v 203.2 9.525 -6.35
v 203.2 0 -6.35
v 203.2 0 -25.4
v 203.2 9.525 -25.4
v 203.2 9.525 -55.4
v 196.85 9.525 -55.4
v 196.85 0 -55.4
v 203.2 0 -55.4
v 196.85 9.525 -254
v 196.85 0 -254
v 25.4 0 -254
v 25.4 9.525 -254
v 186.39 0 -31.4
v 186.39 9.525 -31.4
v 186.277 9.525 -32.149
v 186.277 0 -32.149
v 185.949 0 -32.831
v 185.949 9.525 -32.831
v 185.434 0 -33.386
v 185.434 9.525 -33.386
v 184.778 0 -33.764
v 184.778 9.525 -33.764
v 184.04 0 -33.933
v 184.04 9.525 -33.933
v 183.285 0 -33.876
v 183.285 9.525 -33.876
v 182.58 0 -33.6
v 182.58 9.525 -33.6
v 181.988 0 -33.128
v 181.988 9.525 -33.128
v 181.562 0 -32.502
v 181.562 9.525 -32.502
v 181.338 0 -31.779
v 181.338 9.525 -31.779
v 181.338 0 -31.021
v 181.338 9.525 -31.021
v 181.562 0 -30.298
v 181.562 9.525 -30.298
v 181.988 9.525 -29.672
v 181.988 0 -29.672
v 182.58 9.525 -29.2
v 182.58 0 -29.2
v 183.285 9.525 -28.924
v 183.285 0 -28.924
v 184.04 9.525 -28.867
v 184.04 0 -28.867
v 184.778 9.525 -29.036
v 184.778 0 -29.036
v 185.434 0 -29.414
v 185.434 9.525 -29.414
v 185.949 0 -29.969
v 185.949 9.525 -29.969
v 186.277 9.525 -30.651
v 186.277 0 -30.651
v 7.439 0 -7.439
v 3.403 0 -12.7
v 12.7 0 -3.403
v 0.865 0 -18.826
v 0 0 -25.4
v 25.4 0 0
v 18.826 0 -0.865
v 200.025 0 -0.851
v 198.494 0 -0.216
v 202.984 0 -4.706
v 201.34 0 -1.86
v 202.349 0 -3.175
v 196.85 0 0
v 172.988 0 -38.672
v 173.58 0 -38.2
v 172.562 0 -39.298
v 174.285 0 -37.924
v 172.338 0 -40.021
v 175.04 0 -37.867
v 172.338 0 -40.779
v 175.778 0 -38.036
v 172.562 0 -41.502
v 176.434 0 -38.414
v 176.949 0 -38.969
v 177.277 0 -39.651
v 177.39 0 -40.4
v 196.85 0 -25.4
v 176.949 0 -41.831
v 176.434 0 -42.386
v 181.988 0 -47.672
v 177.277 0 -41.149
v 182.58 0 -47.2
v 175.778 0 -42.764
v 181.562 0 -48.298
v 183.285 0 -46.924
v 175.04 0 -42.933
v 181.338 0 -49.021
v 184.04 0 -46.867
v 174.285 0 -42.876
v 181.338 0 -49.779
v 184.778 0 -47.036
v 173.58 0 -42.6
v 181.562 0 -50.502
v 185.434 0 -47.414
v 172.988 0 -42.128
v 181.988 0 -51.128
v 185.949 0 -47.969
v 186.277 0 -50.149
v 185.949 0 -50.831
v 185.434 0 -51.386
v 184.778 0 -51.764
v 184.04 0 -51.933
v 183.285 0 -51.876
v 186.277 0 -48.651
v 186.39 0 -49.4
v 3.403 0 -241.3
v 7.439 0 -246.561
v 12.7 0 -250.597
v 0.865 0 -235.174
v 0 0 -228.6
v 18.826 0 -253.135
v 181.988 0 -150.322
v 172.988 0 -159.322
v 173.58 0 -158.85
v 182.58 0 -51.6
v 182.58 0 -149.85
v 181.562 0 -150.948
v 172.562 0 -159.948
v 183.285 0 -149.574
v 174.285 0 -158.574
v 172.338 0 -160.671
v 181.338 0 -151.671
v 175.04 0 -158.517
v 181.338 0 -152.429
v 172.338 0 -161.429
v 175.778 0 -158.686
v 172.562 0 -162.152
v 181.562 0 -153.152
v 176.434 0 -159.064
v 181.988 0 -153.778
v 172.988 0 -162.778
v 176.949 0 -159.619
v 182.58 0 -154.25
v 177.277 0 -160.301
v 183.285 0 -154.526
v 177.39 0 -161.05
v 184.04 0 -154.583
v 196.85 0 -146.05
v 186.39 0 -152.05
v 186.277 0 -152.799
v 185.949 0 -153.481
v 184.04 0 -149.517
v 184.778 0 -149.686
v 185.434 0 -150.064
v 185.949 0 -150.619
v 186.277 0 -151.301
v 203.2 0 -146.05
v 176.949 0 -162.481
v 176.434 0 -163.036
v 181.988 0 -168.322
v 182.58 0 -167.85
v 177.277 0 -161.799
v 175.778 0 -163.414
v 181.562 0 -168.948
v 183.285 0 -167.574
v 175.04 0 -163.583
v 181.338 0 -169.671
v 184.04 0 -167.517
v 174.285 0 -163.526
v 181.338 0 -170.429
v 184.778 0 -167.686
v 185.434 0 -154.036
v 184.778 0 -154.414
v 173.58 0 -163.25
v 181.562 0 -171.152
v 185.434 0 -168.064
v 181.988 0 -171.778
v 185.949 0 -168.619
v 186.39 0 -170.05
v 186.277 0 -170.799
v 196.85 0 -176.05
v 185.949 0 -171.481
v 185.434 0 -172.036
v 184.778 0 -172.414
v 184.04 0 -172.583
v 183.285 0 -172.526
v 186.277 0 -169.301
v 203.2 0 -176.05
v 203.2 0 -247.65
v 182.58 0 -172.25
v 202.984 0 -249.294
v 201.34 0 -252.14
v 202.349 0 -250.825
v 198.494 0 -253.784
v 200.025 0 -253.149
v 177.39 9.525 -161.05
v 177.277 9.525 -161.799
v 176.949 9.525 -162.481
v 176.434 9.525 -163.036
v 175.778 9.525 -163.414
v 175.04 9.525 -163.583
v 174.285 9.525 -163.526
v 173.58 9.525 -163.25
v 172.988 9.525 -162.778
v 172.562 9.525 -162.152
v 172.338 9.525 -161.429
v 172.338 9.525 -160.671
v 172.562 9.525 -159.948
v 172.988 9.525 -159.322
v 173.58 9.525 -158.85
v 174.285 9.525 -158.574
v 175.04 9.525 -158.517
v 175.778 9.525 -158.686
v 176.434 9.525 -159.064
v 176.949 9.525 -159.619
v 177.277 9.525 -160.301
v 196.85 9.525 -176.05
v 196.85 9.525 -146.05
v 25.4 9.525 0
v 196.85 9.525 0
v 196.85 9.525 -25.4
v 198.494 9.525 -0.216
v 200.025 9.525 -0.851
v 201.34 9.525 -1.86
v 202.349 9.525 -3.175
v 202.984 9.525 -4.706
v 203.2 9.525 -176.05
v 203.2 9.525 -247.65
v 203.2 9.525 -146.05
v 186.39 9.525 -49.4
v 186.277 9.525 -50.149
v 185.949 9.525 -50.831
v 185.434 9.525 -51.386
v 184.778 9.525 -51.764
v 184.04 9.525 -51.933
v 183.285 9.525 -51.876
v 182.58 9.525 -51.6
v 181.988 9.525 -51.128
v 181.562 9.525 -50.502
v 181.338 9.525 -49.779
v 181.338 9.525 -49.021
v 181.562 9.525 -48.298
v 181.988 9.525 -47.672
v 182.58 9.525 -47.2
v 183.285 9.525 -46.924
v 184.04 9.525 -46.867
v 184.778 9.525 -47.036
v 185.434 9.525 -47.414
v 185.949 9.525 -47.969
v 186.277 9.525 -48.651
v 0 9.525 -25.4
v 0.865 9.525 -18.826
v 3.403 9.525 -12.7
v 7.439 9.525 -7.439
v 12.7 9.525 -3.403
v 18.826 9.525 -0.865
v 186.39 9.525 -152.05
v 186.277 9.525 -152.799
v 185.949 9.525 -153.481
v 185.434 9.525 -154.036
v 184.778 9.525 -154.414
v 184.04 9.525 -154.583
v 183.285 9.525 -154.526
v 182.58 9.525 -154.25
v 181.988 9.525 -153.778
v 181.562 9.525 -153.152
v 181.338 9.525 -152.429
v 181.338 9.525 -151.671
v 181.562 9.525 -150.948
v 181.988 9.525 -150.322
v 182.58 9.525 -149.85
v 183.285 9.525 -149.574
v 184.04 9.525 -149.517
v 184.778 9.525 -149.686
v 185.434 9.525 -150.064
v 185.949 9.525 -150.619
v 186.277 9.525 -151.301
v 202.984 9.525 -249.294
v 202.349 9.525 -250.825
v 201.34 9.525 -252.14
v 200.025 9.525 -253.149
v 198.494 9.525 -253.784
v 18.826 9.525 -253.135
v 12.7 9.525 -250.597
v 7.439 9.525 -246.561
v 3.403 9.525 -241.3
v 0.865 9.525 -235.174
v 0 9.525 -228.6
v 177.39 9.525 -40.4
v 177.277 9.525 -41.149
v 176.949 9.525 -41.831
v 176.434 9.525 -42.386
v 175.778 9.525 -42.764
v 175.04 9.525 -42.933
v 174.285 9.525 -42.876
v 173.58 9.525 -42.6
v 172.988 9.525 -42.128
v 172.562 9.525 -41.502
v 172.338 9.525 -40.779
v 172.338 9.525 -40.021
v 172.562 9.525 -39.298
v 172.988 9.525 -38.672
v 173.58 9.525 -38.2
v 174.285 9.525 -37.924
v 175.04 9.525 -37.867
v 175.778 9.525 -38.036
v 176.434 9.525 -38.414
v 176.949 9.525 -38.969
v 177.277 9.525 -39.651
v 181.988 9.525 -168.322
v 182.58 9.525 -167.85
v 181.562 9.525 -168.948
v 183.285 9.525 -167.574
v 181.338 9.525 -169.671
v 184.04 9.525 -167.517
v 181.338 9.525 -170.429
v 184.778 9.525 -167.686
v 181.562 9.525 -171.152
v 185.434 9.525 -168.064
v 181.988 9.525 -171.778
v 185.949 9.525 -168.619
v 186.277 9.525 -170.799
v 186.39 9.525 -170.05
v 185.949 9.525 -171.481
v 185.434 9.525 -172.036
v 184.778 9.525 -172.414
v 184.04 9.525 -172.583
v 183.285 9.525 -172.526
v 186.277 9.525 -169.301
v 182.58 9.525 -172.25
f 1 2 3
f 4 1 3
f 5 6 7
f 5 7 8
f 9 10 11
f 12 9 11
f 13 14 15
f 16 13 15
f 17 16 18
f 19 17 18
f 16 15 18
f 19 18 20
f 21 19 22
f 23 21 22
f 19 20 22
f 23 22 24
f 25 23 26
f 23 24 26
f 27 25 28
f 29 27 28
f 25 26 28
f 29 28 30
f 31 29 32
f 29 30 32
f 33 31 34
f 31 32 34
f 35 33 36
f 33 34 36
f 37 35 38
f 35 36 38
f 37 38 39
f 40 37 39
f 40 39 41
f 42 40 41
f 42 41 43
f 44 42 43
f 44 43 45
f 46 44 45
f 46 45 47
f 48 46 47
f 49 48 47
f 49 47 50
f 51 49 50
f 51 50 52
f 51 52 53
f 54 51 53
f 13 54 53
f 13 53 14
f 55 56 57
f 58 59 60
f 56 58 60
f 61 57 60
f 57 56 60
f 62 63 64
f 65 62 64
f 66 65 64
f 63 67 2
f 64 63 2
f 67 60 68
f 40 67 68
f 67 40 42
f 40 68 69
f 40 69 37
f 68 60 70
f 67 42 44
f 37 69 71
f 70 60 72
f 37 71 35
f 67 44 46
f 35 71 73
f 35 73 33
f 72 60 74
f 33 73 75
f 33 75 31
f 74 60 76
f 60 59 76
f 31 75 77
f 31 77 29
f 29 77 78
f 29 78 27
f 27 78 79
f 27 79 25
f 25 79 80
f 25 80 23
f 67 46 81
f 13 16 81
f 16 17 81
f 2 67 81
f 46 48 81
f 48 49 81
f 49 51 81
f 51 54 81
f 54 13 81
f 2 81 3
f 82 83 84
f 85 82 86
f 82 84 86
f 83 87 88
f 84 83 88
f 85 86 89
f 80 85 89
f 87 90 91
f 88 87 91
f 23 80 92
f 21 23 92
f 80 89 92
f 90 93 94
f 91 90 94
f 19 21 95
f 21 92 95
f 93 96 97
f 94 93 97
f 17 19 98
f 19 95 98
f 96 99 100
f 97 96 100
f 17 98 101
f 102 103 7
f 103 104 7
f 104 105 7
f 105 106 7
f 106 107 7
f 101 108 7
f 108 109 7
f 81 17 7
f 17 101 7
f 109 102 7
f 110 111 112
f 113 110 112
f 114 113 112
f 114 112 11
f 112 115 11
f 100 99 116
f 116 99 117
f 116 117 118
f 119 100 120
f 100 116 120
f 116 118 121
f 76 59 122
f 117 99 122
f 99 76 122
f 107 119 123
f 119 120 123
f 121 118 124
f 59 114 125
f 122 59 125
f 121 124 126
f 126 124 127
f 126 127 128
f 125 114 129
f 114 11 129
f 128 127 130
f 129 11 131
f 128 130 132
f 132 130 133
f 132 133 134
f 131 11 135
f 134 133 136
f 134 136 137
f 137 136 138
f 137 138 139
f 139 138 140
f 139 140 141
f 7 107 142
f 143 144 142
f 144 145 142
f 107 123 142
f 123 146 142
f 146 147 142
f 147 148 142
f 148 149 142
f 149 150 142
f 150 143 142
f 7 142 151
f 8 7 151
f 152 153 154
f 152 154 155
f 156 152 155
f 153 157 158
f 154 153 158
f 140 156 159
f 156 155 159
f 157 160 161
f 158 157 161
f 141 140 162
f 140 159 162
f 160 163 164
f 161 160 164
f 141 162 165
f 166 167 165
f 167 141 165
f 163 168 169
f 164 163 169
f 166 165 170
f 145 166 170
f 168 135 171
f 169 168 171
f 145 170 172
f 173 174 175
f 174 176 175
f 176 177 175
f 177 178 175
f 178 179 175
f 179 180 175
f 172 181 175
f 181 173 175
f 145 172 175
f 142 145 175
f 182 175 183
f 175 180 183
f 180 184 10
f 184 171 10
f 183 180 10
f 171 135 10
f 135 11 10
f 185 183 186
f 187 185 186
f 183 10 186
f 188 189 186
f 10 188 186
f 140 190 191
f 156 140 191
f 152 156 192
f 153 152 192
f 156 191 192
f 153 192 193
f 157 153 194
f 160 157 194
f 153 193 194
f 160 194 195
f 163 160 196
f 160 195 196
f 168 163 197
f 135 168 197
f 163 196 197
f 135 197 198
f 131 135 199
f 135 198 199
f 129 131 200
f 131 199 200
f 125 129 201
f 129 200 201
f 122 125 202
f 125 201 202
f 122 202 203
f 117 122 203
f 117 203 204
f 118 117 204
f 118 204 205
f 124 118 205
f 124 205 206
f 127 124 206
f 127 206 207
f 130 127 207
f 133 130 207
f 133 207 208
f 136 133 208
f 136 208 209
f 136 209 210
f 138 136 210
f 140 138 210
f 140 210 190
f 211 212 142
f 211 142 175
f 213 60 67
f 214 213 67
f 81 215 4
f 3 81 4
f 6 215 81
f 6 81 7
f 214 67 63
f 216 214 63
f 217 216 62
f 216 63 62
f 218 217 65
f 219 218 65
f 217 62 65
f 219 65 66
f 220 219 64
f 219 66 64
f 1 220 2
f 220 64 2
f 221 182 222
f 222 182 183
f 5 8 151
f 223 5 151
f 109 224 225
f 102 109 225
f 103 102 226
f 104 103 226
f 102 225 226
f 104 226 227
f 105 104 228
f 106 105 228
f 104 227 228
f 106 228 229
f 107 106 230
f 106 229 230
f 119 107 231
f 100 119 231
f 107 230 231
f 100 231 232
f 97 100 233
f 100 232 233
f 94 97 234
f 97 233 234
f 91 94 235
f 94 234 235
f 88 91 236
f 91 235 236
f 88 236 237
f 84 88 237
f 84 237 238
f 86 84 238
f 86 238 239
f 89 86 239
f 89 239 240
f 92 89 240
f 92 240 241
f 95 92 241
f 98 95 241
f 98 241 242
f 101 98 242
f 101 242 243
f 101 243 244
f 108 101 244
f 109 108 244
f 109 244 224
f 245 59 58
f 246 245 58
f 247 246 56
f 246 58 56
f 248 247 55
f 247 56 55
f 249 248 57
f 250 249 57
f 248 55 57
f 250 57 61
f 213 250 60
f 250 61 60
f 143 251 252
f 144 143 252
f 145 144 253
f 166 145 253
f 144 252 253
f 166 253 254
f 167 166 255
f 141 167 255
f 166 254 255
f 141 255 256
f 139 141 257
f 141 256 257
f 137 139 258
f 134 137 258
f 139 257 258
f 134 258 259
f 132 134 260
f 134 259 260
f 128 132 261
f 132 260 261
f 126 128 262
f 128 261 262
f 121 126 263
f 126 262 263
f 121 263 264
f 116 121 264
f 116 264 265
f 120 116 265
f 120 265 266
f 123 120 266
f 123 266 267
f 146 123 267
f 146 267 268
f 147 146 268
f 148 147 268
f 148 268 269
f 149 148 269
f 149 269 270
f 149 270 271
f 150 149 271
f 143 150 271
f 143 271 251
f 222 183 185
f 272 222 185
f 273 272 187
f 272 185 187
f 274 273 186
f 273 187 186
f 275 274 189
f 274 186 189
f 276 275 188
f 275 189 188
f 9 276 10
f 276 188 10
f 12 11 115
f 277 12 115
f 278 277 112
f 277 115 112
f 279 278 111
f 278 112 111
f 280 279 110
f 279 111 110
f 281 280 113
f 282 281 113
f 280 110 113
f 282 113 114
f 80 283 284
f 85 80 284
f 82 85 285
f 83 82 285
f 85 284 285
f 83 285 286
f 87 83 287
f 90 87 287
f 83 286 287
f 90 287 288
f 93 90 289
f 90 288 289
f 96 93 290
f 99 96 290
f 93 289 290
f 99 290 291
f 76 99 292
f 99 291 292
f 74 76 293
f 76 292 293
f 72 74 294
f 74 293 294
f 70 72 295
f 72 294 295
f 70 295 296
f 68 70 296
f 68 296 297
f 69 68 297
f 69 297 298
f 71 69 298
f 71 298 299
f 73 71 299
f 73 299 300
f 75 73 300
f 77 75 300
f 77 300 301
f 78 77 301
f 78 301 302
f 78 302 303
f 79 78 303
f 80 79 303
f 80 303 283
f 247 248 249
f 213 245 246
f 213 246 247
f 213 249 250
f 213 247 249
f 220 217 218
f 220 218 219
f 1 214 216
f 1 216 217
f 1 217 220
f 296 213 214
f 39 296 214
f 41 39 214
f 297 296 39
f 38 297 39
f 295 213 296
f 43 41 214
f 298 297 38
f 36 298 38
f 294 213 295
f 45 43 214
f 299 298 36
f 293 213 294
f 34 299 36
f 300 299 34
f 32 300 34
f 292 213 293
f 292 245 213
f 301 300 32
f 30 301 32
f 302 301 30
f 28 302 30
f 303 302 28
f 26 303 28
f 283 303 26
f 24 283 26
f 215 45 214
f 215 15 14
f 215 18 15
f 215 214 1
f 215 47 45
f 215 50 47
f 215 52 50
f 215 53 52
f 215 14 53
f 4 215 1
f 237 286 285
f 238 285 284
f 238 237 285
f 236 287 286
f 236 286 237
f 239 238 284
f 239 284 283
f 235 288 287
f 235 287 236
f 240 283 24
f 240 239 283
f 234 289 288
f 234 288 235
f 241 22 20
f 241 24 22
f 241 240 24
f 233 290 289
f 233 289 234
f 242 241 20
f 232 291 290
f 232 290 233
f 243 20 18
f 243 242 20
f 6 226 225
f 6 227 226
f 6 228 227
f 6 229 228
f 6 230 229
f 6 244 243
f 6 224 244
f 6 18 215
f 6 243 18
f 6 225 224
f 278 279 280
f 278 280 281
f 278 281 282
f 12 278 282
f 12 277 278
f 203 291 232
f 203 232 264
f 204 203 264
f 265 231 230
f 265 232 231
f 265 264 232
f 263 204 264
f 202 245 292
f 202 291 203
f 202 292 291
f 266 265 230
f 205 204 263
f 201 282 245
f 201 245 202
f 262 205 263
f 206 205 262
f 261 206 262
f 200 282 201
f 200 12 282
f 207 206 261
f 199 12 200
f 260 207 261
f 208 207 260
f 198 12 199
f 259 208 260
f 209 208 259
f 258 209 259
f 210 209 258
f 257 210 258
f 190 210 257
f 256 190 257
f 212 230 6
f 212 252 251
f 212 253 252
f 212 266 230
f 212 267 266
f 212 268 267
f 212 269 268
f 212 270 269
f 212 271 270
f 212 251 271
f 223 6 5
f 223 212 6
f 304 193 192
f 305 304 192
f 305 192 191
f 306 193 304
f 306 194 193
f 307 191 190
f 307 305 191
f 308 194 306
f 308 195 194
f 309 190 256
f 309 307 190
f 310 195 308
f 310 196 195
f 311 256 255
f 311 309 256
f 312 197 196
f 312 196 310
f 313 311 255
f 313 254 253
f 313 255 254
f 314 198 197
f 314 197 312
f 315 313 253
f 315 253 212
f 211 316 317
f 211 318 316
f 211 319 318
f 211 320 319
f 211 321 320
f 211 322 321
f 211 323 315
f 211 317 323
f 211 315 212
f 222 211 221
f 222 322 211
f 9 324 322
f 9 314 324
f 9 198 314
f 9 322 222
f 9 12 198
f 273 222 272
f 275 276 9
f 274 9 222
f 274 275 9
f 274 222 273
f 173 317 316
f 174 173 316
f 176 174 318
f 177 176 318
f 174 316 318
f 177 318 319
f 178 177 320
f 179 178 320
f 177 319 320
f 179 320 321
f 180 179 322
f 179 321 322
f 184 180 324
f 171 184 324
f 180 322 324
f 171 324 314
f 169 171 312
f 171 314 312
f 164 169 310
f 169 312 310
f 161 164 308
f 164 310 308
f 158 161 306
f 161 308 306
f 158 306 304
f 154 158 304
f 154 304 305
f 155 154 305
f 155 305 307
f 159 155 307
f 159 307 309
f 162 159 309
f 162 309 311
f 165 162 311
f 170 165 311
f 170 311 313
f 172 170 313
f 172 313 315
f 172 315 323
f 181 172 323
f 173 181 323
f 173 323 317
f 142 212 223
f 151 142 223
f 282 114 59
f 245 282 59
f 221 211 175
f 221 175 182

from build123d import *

# Parameters (mm, degrees)
BOSS_EXTRUDE1_DEPTH = 9.525
CUT_EXTRUDE1_REACH  = 11.525
SKETCH2_R           = 2.54
SKETCH2_W           = 6.35
SKETCH2_H           = 30


with BuildPart() as part:
    # Sketch1 → Boss-Extrude1 (new body)
    with BuildSketch(Plane(origin=(0, 0, 0), x_dir=(1, 0, 0), z_dir=(0, 1, 0))):
        with BuildLine():
            Line((25.4, 0), (196.85, 0))
            ThreePointArc((196.85, 0), (201.340128061, 1.859871939), (203.2, 6.35))
            Line((203.2, 6.35), (203.2, 247.65))
            ThreePointArc((203.2, 247.65), (201.340128061, 252.140128061), (196.85, 254))
            Line((196.85, 254), (25.4, 254))
            ThreePointArc((25.4, 254), (7.439487758, 246.560512242), (0, 228.6))
            Line((0, 228.6), (0, 25.4))
            ThreePointArc((0, 25.4), (7.439487758, 7.439487758), (25.4, 0))
        make_face()
    extrude(amount=BOSS_EXTRUDE1_DEPTH)

    # Sketch2 → Cut-Extrude1 (cut, up to next)
    with BuildSketch(Plane(origin=(0, 9.525, 0), x_dir=(1, 0, 0), z_dir=(0, 1, 0)), mode=Mode.PRIVATE) as cut_extrude1_sk1:
        with Locations((174.85000082, 40.4)):
            Circle(SKETCH2_R)
    cut_extrude1_tool1 = extrude(cut_extrude1_sk1.sketch, amount=-CUT_EXTRUDE1_REACH, mode=Mode.PRIVATE) & part.part
    add(cut_extrude1_tool1.solids().sort_by_distance((174.850001, 9.525, -40.4))[0], mode=Mode.SUBTRACT)
    # Sketch2 → Cut-Extrude1 (cut, up to next)
    with BuildSketch(Plane(origin=(0, 9.525, 0), x_dir=(1, 0, 0), z_dir=(0, 1, 0)), mode=Mode.PRIVATE) as cut_extrude1_sk2:
        with Locations((183.8500006, 49.39999978)):
            Circle(SKETCH2_R)
    cut_extrude1_tool2 = extrude(cut_extrude1_sk2.sketch, amount=-CUT_EXTRUDE1_REACH, mode=Mode.PRIVATE) & part.part
    add(cut_extrude1_tool2.solids().sort_by_distance((183.850001, 9.525, -49.4))[0], mode=Mode.SUBTRACT)
    # Sketch2 → Cut-Extrude1 (cut, up to next)
    with BuildSketch(Plane(origin=(0, 9.525, 0), x_dir=(1, 0, 0), z_dir=(0, 1, 0)), mode=Mode.PRIVATE) as cut_extrude1_sk3:
        with Locations((183.8500006, 31.40000022)):
            Circle(SKETCH2_R)
    cut_extrude1_tool3 = extrude(cut_extrude1_sk3.sketch, amount=-CUT_EXTRUDE1_REACH, mode=Mode.PRIVATE) & part.part
    add(cut_extrude1_tool3.solids().sort_by_distance((183.850001, 9.525, -31.4))[0], mode=Mode.SUBTRACT)
    # Sketch2 → Cut-Extrude1 (cut, up to next)
    with BuildSketch(Plane(origin=(0, 9.525, 0), x_dir=(1, 0, 0), z_dir=(0, 1, 0)), mode=Mode.PRIVATE) as cut_extrude1_sk4:
        with Locations((174.85000082, 161.05)):
            Circle(SKETCH2_R)
    cut_extrude1_tool4 = extrude(cut_extrude1_sk4.sketch, amount=-CUT_EXTRUDE1_REACH, mode=Mode.PRIVATE) & part.part
    add(cut_extrude1_tool4.solids().sort_by_distance((174.850001, 9.525, -161.05))[0], mode=Mode.SUBTRACT)
    # Sketch2 → Cut-Extrude1 (cut, up to next)
    with BuildSketch(Plane(origin=(0, 9.525, 0), x_dir=(1, 0, 0), z_dir=(0, 1, 0)), mode=Mode.PRIVATE) as cut_extrude1_sk5:
        with Locations((183.8500006, 170.04999978)):
            Circle(SKETCH2_R)
    cut_extrude1_tool5 = extrude(cut_extrude1_sk5.sketch, amount=-CUT_EXTRUDE1_REACH, mode=Mode.PRIVATE) & part.part
    add(cut_extrude1_tool5.solids().sort_by_distance((183.850001, 9.525, -170.05))[0], mode=Mode.SUBTRACT)
    # Sketch2 → Cut-Extrude1 (cut, up to next)
    with BuildSketch(Plane(origin=(0, 9.525, 0), x_dir=(1, 0, 0), z_dir=(0, 1, 0)), mode=Mode.PRIVATE) as cut_extrude1_sk6:
        with Locations((183.8500006, 152.05000022)):
            Circle(SKETCH2_R)
    cut_extrude1_tool6 = extrude(cut_extrude1_sk6.sketch, amount=-CUT_EXTRUDE1_REACH, mode=Mode.PRIVATE) & part.part
    add(cut_extrude1_tool6.solids().sort_by_distance((183.850001, 9.525, -152.05))[0], mode=Mode.SUBTRACT)
    # Sketch2 → Cut-Extrude1 (cut, up to next)
    with BuildSketch(Plane(origin=(0, 9.525, 0), x_dir=(1, 0, 0), z_dir=(0, 1, 0)), mode=Mode.PRIVATE) as cut_extrude1_sk7:
        with Locations((200.025, 40.4)):
            Rectangle(SKETCH2_W, SKETCH2_H)
    cut_extrude1_tool7 = extrude(cut_extrude1_sk7.sketch, amount=-CUT_EXTRUDE1_REACH, mode=Mode.PRIVATE) & part.part
    add(cut_extrude1_tool7.solids().sort_by_distance((200.025, 9.525, -40.4))[0], mode=Mode.SUBTRACT)
    # Sketch2 → Cut-Extrude1 (cut, up to next)
    with BuildSketch(Plane(origin=(0, 9.525, 0), x_dir=(1, 0, 0), z_dir=(0, 1, 0)), mode=Mode.PRIVATE) as cut_extrude1_sk8:
        with Locations((200.025, 161.05)):
            Rectangle(SKETCH2_W, SKETCH2_H)
    cut_extrude1_tool8 = extrude(cut_extrude1_sk8.sketch, amount=-CUT_EXTRUDE1_REACH, mode=Mode.PRIVATE) & part.part
    add(cut_extrude1_tool8.solids().sort_by_distance((200.025, 9.525, -161.05))[0], mode=Mode.SUBTRACT)


solid = part.part
